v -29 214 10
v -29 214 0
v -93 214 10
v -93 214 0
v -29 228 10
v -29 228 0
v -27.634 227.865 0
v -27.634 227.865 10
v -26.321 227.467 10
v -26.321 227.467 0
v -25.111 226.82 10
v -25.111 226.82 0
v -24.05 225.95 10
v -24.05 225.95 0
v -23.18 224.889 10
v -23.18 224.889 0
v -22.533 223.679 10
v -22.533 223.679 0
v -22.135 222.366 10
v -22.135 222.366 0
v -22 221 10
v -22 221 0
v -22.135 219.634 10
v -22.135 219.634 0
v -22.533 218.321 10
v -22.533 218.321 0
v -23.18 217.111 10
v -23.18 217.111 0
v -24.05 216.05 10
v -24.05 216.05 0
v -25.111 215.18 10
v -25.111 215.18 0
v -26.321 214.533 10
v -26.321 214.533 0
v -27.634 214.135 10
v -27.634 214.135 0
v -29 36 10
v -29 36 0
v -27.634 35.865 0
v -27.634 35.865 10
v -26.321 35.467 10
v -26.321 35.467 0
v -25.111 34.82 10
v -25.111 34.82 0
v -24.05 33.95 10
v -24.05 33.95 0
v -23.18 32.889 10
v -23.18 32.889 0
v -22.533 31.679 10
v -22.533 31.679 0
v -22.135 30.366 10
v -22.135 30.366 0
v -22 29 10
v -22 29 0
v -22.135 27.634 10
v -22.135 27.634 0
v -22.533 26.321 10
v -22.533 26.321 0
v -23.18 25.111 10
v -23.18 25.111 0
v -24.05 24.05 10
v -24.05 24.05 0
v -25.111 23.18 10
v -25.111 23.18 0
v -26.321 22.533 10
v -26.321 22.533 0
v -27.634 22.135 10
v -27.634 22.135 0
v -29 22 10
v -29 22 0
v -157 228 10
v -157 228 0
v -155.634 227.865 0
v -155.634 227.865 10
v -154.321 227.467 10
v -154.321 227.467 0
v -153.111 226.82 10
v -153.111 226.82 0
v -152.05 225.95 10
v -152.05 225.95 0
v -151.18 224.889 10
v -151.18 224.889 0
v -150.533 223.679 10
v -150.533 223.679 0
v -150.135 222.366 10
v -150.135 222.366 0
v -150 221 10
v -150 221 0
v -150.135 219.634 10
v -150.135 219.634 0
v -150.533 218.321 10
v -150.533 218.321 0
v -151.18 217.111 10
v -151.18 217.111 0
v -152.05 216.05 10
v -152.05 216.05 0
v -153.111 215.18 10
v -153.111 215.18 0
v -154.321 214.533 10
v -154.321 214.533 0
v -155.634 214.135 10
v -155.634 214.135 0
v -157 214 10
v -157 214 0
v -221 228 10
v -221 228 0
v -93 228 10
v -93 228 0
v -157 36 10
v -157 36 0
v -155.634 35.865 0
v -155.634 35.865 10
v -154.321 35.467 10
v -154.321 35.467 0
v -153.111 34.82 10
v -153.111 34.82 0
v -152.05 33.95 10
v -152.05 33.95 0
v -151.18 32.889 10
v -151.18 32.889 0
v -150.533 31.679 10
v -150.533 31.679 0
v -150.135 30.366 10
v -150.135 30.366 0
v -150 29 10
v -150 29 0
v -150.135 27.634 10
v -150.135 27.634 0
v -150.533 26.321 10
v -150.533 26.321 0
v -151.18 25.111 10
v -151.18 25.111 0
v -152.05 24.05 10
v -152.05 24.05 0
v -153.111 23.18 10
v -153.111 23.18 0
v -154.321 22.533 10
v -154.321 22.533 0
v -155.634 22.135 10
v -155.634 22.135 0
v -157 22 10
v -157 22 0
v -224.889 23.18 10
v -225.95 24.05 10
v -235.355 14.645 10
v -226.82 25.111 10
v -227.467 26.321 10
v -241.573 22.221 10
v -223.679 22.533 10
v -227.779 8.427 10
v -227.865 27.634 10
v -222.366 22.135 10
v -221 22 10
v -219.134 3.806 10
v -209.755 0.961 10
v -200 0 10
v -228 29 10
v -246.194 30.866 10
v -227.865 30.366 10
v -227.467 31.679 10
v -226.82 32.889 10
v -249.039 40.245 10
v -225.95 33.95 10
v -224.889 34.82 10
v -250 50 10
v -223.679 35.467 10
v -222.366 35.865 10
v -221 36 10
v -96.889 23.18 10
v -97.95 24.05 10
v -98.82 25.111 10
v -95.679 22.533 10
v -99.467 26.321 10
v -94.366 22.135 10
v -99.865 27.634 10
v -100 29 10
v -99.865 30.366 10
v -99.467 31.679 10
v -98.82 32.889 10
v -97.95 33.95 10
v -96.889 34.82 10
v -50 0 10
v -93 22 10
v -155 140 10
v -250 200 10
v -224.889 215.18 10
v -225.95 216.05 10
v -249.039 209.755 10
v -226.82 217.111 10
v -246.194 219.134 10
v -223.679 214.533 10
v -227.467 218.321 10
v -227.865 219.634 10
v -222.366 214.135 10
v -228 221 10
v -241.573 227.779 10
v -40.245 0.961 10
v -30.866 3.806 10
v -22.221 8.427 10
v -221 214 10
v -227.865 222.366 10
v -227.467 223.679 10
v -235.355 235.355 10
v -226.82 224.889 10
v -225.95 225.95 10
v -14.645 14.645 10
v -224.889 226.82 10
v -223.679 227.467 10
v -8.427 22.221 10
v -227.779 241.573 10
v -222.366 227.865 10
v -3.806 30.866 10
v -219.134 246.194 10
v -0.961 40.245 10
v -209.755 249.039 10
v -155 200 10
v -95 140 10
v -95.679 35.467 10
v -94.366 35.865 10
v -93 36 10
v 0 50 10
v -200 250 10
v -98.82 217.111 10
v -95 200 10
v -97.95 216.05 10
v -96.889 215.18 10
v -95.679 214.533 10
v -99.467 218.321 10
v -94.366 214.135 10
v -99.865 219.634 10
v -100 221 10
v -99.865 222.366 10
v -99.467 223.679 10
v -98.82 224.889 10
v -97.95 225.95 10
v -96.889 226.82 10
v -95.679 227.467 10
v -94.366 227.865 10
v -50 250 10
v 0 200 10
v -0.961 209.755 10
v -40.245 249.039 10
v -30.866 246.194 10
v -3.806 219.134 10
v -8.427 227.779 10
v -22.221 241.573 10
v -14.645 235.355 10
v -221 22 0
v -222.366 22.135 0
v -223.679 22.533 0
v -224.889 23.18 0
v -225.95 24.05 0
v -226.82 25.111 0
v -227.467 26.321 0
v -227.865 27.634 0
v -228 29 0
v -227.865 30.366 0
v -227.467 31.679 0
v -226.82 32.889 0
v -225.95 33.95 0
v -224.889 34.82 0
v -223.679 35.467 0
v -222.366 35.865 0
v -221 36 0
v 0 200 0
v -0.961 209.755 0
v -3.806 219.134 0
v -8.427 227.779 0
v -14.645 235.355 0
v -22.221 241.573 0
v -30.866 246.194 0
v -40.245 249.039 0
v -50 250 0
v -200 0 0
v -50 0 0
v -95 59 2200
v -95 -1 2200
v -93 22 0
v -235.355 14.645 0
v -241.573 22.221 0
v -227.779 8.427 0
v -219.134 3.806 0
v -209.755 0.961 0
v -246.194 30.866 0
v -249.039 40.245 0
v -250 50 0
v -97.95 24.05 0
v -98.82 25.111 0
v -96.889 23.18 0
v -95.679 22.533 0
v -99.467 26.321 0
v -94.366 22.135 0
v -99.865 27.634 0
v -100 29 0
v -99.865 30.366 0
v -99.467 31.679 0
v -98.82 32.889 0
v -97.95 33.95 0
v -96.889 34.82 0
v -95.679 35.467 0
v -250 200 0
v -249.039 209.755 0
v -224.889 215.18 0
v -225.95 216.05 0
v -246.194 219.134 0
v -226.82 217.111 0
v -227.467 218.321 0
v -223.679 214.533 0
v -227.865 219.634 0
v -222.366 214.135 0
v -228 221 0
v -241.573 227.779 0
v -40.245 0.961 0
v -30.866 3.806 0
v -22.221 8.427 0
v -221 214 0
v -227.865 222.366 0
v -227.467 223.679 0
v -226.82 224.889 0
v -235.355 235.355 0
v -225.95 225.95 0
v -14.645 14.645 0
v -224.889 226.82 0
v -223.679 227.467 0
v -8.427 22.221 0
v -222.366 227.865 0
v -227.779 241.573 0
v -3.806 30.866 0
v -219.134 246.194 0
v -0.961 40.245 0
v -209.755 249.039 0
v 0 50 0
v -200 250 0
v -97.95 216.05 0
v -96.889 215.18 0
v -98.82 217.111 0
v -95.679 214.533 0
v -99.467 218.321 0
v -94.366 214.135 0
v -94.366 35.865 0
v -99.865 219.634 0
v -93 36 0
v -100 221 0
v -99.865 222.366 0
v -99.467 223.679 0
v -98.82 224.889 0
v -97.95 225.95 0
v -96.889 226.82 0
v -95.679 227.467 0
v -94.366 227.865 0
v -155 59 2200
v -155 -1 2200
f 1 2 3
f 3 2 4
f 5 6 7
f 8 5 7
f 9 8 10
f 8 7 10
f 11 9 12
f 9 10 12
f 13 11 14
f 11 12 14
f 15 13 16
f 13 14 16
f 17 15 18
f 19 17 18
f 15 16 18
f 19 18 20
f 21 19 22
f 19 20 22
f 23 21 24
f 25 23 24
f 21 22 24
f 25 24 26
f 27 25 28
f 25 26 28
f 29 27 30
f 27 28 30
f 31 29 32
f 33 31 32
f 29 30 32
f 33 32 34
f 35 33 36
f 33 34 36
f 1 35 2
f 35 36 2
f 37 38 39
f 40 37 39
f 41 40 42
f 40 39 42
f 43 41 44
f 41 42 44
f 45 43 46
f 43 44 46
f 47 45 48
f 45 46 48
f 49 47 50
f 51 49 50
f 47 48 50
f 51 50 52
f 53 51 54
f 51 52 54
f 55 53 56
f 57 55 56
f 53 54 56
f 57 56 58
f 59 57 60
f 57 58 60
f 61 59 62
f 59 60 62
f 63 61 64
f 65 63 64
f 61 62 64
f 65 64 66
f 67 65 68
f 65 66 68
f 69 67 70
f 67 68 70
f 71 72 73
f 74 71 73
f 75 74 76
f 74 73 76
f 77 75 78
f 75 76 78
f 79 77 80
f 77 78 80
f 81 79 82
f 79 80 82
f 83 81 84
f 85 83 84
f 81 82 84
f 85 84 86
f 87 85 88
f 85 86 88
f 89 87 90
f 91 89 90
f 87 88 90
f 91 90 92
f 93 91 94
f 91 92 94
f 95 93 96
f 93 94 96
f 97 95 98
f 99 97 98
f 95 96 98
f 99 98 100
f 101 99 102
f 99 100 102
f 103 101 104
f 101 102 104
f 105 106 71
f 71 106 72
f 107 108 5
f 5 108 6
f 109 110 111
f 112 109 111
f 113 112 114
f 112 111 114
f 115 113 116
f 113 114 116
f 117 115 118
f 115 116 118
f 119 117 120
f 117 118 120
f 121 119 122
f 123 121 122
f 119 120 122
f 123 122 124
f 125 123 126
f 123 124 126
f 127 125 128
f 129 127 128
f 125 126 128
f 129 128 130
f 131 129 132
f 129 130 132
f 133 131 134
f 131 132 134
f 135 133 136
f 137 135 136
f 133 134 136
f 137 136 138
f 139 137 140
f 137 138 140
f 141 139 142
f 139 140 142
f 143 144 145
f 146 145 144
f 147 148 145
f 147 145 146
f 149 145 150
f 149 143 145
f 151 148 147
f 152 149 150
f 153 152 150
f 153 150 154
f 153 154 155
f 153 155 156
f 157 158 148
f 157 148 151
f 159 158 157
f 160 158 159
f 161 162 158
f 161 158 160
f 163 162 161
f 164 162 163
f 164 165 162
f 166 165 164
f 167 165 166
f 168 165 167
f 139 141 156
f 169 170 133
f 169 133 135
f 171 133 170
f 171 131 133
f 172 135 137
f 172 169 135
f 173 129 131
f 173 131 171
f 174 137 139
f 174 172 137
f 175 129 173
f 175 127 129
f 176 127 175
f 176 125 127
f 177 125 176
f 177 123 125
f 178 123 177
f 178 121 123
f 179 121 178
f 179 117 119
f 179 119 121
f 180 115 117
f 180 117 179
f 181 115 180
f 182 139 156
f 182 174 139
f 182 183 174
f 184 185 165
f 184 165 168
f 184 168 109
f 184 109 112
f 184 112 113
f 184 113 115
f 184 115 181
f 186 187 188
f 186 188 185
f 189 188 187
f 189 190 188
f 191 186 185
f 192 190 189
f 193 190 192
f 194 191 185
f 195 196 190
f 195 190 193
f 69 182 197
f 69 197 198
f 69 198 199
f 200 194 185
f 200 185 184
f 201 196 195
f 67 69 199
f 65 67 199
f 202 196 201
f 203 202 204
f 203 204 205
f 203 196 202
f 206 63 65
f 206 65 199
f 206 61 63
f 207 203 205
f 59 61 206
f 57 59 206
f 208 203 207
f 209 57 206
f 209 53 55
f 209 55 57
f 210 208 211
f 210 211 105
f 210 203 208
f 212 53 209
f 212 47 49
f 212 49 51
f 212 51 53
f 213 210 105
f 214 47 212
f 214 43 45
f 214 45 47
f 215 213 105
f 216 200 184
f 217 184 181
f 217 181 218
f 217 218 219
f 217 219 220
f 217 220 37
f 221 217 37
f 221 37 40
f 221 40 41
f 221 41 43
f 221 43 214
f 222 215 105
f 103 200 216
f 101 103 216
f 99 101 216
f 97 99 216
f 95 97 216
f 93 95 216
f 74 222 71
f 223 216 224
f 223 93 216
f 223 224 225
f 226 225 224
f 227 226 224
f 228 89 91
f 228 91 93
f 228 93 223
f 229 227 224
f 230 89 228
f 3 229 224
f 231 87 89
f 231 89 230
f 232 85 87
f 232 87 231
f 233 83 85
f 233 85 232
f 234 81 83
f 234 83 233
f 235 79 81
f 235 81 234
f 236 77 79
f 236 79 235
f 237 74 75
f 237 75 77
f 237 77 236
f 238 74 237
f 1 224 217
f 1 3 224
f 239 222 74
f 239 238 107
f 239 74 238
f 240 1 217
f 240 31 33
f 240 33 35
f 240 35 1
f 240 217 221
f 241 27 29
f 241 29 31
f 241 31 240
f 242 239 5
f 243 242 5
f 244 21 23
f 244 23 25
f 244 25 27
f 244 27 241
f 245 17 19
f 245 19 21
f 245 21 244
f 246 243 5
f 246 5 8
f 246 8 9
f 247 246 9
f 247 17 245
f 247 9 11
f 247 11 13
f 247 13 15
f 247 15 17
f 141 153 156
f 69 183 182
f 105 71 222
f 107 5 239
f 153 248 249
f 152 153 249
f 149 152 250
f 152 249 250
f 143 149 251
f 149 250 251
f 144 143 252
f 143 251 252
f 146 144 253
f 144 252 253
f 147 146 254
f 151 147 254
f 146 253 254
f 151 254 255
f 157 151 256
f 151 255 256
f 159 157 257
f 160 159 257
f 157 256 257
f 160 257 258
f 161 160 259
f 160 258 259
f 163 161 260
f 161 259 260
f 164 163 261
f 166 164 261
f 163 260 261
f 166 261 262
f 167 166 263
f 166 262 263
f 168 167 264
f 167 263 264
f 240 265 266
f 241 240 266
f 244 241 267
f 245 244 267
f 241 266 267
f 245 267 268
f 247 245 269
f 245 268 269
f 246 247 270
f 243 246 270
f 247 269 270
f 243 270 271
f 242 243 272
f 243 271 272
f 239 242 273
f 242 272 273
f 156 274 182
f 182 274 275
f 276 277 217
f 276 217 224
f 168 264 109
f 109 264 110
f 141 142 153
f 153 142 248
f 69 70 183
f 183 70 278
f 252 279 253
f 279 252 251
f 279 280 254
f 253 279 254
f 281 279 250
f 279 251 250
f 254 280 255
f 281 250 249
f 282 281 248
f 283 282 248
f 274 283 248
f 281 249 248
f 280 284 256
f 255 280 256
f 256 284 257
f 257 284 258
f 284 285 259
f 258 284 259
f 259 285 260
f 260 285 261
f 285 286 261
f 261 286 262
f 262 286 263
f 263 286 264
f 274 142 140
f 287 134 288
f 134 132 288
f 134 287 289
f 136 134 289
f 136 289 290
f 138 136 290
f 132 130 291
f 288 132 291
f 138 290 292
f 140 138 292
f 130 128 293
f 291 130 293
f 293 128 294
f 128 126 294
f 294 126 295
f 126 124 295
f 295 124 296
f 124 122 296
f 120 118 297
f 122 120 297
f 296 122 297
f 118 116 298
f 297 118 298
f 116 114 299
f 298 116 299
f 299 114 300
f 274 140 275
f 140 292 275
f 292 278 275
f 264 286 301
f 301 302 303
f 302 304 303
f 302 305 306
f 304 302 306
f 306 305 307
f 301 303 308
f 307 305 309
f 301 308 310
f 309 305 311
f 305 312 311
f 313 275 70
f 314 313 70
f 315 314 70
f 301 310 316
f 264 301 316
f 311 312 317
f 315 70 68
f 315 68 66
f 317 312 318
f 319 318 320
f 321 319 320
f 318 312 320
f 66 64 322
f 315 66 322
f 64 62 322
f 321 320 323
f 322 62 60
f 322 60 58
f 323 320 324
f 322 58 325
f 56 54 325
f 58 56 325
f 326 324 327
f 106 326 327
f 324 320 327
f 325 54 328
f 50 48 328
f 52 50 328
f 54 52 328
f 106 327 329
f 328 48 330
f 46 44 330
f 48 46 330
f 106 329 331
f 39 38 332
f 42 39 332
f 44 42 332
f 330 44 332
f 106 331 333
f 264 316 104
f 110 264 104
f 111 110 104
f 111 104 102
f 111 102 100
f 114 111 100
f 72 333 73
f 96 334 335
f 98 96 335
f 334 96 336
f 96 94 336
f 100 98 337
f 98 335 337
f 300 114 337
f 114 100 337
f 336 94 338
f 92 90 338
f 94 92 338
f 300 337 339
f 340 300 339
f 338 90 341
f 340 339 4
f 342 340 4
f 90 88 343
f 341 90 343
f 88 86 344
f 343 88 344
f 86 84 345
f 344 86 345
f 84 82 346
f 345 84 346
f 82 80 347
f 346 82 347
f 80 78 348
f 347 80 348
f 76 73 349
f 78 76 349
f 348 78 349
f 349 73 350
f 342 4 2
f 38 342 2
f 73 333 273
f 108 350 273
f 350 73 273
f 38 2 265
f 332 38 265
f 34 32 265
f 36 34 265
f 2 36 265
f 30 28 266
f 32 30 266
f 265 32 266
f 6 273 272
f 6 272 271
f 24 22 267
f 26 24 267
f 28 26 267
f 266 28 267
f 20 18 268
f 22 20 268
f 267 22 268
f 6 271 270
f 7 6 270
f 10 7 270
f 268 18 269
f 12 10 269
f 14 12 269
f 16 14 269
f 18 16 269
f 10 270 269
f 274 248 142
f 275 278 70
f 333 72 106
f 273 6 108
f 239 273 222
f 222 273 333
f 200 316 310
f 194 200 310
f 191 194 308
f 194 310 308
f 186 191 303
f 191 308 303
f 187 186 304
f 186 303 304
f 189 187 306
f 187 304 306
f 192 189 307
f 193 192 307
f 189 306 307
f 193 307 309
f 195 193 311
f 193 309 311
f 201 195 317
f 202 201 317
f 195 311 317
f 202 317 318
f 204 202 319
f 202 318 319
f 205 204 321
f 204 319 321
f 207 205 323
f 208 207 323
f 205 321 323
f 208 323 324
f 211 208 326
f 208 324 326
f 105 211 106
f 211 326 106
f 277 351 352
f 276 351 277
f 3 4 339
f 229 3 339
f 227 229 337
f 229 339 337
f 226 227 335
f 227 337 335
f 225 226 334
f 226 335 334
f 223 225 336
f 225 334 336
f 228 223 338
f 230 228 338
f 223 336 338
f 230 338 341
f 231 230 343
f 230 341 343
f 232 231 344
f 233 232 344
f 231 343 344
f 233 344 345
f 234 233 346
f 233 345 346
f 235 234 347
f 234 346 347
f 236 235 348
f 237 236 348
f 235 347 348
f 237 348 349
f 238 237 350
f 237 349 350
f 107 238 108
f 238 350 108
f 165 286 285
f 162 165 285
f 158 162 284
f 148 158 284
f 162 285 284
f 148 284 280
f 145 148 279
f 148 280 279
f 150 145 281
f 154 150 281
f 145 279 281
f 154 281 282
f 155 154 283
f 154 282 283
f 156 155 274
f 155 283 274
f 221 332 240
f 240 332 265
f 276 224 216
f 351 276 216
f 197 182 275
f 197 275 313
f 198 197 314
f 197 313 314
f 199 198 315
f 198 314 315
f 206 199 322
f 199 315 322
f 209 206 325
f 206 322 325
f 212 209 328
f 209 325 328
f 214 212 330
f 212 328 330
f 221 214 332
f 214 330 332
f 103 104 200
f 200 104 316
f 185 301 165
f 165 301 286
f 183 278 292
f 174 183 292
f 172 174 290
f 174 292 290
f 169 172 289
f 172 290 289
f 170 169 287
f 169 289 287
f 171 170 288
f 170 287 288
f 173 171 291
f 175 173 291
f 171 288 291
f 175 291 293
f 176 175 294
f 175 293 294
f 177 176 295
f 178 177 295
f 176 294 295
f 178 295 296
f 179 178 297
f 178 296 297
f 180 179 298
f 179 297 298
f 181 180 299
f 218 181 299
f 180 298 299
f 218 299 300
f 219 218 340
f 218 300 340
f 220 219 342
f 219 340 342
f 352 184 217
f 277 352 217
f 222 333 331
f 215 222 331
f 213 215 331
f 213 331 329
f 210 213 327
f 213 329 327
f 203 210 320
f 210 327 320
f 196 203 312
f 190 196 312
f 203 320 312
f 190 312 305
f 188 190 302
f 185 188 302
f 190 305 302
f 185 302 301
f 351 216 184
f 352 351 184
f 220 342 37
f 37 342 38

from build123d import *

# Parameters (mm, degrees)
F1_DEPTH = 10
F2_W     = 60
F2_H     = 60


with BuildPart() as f1:
    # F0 (on Top) → F1 (new body)
    with BuildSketch(Plane.XY):
        with BuildLine():
            Line((-200, 0), (-50, 0))
            ThreePointArc((-50, 0), (-14.6446609407, 14.6446609407), (0, 50))
            Line((0, 50), (0, 200))
            ThreePointArc((0, 200), (-14.6446609407, 235.3553390593), (-50, 250))
            Line((-50, 250), (-200, 250))
            ThreePointArc((-200, 250), (-235.3553390593, 235.3553390593), (-250, 200))
            Line((-250, 200), (-250, 50))
            ThreePointArc((-250, 50), (-235.3553390593, 14.6446609407), (-200, 0))
        make_face()
        with BuildLine():
            ThreePointArc((-221, 22), (-228, 29), (-221, 36))
            Line((-221, 36), (-157, 36))
            ThreePointArc((-157, 36), (-150, 29), (-157, 22))
            Line((-157, 22), (-221, 22))
        make_face(mode=Mode.SUBTRACT)
        with BuildLine():
            Line((-93, 36), (-29, 36))
            ThreePointArc((-29, 36), (-22, 29), (-29, 22))
            Line((-29, 22), (-93, 22))
            ThreePointArc((-93, 22), (-100, 29), (-93, 36))
        make_face(mode=Mode.SUBTRACT)
        with BuildLine():
            Line((-157, 214), (-221, 214))
            ThreePointArc((-221, 214), (-228, 221), (-221, 228))
            Line((-221, 228), (-157, 228))
            ThreePointArc((-157, 228), (-150, 221), (-157, 214))
        make_face(mode=Mode.SUBTRACT)
        with BuildLine():
            ThreePointArc((-93, 214), (-100, 221), (-93, 228))
            Line((-93, 228), (-29, 228))
            ThreePointArc((-29, 228), (-22, 221), (-29, 214))
            Line((-29, 214), (-93, 214))
        make_face(mode=Mode.SUBTRACT)
    extrude(amount=F1_DEPTH)

    # F4: sweep along a path in F3
    with BuildLine(Plane.YZ) as f4_path:
        Line((29, 2200), (170, 10))
    # F2 (on face) → F4 (sweep)
    with BuildSketch(Plane.XY.offset(10)):
        with Locations((-125, 170)):
            Rectangle(F2_W, F2_H)
    sweep(path=f4_path.line)


solid = f1.part
